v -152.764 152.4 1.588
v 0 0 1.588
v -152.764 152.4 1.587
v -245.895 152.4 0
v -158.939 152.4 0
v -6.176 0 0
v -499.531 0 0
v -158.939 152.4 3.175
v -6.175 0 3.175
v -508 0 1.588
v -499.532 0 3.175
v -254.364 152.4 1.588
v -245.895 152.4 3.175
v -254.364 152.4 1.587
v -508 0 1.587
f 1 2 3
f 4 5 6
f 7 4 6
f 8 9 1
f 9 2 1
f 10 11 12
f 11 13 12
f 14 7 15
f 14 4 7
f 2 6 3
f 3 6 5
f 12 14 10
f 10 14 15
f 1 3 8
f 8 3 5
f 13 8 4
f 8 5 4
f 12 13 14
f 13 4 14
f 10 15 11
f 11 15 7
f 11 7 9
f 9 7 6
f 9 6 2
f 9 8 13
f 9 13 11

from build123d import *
from OCP.BRepFilletAPI import BRepFilletAPI_MakeChamfer

# Parameters (mm, degrees)
BOSS_EXTRUDE4_DEPTH = 3.175
CHAMFER1_SIZE       = 1.5875
CHAMFER1_SIZE2      = 4.361620403
CHAMFER2_SIZE       = 4.361620403
CHAMFER2_SIZE_2     = 1.5875


with BuildPart() as part:
    # Sketch1 → Boss-Extrude4 (new body)
    with BuildSketch(Plane.XY):
        Polygon((-508, 0), (0, 0), (-152.76380689, 152.4), (-254.36380689, 152.4), align=None)
    extrude(amount=BOSS_EXTRUDE4_DEPTH)

    # Chamfer1: one chamfer whose edges measure the first distance from different faces: ONE call of the kernel's chamfer builder (chamfer() names one face for all edges)
    chamfer1_edges_1 = [part.edges().sort_by_distance(p)[0] for p in [
        (-76.381903445, 76.2, 0),
    ]]
    chamfer1_side_1 = [part.faces().sort_by_distance(p)[0] for p in [
        (-76.381903445, 76.2, 1.5875),
    ]]
    chamfer1_edges_2 = [part.edges().sort_by_distance(p)[0] for p in [
        (-381.181903445, 76.2, 0),
    ]]
    chamfer1_side_2 = [part.faces().sort_by_distance(p)[0] for p in [
        (-381.181903445, 76.2, 1.5875),
    ]]
    chamfer1 = BRepFilletAPI_MakeChamfer(part.part.solid().wrapped)
    for e in chamfer1_edges_1:
        chamfer1.Add(CHAMFER1_SIZE, CHAMFER1_SIZE2, e.wrapped, chamfer1_side_1[0].wrapped)  # the first distance lies on this face
    for e in chamfer1_edges_2:
        chamfer1.Add(CHAMFER1_SIZE, CHAMFER1_SIZE2, e.wrapped, chamfer1_side_2[0].wrapped)  # the first distance lies on this face
    add(Compound.cast(chamfer1.Shape()), mode=Mode.REPLACE)

    # Chamfer2
    chamfer2_edges_1 = [part.edges().sort_by_distance(p)[0] for p in [
        (-76.381903445, 76.2, 3.175),
    ]]
    chamfer2_side_1 = [part.faces().sort_by_distance(p)[0] for p in [
        (-76.404327304, 76.177522611, 3.175),
    ]]
    chamfer2_edges_2 = [part.edges().sort_by_distance(p)[0] for p in [
        (-381.181903445, 76.2, 3.175),
    ]]
    chamfer2_side_2 = [part.faces().sort_by_distance(p)[0] for p in [
        (-381.181903445, 76.2, 3.14325),
    ]]
    chamfer2 = BRepFilletAPI_MakeChamfer(part.part.solid().wrapped)
    for e in chamfer2_edges_1:
        chamfer2.Add(CHAMFER2_SIZE - 0.0001, CHAMFER2_SIZE_2 - 0.0001, e.wrapped, chamfer2_side_1[0].wrapped)
    for e in chamfer2_edges_2:
        chamfer2.Add(CHAMFER2_SIZE_2 - 0.0001, CHAMFER2_SIZE - 0.0001, e.wrapped, chamfer2_side_2[0].wrapped)
    add(Compound.cast(chamfer2.Shape()), mode=Mode.REPLACE)  # a hair under: the kernel refuses the full size


solid = part.part
